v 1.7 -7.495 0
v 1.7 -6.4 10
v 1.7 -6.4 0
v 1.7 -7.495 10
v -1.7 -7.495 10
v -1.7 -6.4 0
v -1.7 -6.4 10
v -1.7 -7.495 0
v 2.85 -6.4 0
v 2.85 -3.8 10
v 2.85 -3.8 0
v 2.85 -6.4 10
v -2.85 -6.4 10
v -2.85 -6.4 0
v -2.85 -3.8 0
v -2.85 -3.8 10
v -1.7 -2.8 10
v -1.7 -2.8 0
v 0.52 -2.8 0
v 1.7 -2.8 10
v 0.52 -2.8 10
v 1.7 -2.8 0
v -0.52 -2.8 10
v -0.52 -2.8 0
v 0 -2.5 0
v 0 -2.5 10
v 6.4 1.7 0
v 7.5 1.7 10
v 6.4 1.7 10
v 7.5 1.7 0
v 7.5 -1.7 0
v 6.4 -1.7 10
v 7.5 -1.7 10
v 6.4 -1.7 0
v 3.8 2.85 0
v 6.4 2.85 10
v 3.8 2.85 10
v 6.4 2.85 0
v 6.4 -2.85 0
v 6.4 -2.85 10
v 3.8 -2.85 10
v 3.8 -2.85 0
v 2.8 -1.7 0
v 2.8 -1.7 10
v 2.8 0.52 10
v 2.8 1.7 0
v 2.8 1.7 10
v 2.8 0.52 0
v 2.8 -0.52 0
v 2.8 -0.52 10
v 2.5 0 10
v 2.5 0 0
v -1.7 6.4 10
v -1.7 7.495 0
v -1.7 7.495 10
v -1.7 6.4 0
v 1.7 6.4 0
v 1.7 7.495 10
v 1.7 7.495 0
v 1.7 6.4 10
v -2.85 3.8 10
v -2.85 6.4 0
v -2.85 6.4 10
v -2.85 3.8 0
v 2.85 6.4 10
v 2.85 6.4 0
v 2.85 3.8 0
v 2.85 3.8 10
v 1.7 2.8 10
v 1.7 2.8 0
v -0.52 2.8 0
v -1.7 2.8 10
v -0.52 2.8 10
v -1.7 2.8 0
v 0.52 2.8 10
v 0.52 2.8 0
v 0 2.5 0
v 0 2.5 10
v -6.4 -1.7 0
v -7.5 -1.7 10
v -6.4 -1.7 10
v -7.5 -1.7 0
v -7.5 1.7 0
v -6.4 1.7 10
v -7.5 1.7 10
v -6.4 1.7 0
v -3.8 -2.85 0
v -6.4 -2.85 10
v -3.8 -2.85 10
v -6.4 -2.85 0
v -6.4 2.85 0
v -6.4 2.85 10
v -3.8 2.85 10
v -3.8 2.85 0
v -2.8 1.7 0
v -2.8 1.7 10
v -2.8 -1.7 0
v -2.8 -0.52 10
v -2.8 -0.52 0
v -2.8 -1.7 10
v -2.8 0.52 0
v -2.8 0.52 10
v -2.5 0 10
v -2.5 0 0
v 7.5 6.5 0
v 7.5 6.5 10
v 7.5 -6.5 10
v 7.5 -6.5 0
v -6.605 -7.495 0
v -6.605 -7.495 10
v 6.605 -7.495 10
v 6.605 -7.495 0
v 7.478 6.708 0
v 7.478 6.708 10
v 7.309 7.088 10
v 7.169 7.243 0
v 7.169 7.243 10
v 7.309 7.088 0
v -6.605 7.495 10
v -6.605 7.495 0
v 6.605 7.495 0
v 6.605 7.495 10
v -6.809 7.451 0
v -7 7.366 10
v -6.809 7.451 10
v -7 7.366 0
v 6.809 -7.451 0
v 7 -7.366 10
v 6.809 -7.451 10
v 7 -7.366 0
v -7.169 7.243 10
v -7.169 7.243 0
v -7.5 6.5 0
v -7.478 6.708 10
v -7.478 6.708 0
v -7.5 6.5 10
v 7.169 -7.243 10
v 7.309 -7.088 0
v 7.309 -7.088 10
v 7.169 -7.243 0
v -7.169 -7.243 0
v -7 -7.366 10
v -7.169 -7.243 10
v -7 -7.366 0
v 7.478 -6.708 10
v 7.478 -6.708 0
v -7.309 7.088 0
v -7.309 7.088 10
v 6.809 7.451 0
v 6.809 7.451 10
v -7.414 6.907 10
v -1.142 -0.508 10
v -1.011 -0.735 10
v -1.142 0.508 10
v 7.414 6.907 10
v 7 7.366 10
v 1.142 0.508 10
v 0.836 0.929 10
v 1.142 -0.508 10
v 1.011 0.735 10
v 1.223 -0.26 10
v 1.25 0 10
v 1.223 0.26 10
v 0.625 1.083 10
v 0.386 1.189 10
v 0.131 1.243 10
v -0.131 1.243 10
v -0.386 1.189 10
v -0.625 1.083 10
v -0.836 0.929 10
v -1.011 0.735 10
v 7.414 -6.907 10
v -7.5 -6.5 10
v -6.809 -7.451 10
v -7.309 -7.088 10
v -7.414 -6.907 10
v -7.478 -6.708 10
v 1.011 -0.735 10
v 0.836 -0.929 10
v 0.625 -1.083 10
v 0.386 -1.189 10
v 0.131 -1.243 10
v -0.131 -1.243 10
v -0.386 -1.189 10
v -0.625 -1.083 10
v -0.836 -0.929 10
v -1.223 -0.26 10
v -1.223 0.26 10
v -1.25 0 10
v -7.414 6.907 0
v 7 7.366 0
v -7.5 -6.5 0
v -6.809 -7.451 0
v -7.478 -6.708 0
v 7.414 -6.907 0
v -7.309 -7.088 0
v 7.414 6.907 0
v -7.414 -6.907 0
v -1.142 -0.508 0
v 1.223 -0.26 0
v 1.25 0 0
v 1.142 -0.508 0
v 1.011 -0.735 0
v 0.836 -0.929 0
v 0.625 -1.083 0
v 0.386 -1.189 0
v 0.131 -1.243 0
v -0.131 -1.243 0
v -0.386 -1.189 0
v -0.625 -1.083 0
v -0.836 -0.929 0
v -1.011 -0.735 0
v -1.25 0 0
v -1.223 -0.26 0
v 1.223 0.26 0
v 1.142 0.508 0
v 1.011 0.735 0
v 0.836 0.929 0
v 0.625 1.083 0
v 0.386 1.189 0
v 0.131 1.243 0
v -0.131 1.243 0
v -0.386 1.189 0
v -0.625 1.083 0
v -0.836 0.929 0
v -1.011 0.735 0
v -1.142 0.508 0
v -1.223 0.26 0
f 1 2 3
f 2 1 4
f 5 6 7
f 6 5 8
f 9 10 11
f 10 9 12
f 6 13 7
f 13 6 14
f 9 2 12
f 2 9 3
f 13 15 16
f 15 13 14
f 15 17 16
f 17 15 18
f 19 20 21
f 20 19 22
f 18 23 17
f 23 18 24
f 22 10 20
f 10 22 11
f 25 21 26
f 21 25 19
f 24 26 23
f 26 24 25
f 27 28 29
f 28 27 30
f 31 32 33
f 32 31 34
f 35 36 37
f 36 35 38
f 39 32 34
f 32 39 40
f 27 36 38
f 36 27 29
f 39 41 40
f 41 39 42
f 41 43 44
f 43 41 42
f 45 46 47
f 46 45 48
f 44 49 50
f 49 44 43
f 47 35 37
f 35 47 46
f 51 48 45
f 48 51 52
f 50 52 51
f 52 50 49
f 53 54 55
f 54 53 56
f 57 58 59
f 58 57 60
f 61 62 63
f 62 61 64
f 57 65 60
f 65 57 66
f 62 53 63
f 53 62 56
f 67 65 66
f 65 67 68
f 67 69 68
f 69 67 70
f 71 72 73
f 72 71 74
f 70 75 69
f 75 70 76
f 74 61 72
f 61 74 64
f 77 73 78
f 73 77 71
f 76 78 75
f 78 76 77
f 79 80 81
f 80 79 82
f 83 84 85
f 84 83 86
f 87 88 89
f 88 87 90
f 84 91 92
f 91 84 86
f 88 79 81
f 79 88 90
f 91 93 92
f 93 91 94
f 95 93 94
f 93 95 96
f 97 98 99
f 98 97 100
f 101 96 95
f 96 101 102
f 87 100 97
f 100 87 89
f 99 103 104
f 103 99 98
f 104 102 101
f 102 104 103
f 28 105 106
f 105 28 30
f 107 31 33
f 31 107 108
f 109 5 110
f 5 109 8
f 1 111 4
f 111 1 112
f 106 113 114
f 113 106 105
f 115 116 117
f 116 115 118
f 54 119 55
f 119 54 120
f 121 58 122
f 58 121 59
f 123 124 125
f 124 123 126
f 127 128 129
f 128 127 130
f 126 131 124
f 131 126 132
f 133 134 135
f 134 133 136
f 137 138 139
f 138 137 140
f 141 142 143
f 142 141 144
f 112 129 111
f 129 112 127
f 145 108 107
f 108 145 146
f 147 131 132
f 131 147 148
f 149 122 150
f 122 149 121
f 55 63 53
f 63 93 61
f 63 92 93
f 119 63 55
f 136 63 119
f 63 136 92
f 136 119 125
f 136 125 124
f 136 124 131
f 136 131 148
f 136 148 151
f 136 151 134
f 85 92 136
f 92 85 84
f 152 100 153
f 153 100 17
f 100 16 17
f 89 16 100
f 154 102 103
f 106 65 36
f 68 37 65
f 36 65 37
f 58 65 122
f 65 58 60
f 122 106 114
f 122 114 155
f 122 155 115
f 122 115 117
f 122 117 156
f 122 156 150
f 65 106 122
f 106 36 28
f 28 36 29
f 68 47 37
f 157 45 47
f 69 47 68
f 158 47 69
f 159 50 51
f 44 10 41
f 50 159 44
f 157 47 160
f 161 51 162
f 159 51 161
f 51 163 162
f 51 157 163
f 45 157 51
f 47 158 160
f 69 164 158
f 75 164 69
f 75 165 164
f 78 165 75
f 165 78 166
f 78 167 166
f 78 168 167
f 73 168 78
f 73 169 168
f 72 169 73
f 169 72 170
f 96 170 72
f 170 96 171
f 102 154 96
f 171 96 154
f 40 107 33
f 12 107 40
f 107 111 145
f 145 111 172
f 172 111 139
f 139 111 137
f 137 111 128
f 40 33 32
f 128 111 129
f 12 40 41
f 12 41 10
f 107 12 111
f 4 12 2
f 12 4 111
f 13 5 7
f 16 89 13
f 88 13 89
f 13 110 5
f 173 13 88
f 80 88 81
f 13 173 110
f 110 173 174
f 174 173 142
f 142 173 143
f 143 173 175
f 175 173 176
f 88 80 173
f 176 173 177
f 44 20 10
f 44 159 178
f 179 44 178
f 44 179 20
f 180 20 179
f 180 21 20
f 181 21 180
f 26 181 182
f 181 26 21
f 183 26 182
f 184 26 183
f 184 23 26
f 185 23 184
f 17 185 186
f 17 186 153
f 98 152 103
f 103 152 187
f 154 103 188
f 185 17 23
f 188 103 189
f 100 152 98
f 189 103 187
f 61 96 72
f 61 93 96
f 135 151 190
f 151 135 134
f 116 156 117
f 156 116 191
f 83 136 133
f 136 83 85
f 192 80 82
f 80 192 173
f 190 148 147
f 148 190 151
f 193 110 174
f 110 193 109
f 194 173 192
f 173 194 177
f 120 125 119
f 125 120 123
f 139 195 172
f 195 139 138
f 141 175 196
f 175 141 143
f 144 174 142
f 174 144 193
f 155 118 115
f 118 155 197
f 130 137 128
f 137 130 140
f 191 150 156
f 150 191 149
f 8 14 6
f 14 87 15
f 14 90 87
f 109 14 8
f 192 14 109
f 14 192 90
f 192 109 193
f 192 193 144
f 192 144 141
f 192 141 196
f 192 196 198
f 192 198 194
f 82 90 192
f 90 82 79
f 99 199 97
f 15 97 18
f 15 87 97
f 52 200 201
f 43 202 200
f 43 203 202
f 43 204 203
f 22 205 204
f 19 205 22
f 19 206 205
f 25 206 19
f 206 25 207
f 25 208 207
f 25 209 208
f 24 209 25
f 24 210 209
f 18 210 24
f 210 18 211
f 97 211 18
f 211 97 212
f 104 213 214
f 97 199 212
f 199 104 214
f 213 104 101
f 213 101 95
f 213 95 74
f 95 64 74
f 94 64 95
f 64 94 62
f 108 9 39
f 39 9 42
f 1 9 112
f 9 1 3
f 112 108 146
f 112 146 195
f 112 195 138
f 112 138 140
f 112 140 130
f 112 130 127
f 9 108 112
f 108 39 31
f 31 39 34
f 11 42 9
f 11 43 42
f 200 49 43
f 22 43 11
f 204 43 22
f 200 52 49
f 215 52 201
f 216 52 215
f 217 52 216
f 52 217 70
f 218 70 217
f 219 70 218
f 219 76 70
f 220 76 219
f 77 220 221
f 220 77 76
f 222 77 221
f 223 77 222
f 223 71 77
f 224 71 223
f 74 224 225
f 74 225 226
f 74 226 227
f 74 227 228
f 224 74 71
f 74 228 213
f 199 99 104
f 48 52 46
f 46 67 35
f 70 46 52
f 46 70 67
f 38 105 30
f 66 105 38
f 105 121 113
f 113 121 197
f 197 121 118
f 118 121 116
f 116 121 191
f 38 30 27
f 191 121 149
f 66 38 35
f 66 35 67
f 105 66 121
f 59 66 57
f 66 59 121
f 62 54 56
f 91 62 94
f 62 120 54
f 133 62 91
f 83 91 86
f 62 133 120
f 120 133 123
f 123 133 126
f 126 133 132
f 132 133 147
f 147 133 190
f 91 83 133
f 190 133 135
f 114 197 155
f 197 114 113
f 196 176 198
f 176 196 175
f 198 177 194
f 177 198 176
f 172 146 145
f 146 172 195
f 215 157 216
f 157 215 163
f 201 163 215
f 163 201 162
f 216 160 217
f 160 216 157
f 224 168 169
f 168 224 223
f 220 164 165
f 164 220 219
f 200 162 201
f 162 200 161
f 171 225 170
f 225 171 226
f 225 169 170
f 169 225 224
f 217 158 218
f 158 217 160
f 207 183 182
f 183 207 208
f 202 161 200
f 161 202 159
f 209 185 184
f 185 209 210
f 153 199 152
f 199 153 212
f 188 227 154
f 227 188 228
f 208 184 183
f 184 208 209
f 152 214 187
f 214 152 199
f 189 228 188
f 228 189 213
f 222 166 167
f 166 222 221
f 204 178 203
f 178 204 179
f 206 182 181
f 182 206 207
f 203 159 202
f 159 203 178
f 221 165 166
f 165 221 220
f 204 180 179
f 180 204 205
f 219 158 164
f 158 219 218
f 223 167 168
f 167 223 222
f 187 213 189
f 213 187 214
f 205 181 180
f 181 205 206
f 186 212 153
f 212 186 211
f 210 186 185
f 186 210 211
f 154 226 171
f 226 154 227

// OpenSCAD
module extrusion1515(length) {
    color("silver") rotate([90, 0, 0]) difference() {
        // main body
        hull() for(x=[6.5,-6.5],z=[6.5,-6.5]) {
            translate([x, 0, z]) rotate([-90, 0, 0]) cylinder(length,r=1,$fn=30);
        }
        // hole in center
        translate([0, -0.5, 0]) rotate([-90, 0, 0])
            cylinder(length+1, d=2.5, true, $fn=30);
        // slots
        for(r=[0,90,180,270]) rotate([0, r, 0]) translate([0, -0.5, 7.5]) {
            translate([-1.7, 0, -1.15]) cube([3.4,length+1,1.2]);
            translate([-2.85, 0, -3.7]) cube([5.7, length+1, 2.6]);
            translate([-2.85, 0, -3.7]) rotate([-90, 0, 0])
                linear_extrude(height=length+1,center=false)
                polygon([[0,-0.05],[0,0],[1.15,1],[4.55,1],[5.7,0],[5.7,-0.05]]);
            translate([0, 0, -4.7]) rotate([-90, 0, 0])
                linear_extrude(height=length+1,center=false)
                polygon([[0.35*sqrt(3),-0.05],[0,0.3],[-0.35*sqrt(3),-0.05]]);
        }
    }
}

extrusion1515(10);
